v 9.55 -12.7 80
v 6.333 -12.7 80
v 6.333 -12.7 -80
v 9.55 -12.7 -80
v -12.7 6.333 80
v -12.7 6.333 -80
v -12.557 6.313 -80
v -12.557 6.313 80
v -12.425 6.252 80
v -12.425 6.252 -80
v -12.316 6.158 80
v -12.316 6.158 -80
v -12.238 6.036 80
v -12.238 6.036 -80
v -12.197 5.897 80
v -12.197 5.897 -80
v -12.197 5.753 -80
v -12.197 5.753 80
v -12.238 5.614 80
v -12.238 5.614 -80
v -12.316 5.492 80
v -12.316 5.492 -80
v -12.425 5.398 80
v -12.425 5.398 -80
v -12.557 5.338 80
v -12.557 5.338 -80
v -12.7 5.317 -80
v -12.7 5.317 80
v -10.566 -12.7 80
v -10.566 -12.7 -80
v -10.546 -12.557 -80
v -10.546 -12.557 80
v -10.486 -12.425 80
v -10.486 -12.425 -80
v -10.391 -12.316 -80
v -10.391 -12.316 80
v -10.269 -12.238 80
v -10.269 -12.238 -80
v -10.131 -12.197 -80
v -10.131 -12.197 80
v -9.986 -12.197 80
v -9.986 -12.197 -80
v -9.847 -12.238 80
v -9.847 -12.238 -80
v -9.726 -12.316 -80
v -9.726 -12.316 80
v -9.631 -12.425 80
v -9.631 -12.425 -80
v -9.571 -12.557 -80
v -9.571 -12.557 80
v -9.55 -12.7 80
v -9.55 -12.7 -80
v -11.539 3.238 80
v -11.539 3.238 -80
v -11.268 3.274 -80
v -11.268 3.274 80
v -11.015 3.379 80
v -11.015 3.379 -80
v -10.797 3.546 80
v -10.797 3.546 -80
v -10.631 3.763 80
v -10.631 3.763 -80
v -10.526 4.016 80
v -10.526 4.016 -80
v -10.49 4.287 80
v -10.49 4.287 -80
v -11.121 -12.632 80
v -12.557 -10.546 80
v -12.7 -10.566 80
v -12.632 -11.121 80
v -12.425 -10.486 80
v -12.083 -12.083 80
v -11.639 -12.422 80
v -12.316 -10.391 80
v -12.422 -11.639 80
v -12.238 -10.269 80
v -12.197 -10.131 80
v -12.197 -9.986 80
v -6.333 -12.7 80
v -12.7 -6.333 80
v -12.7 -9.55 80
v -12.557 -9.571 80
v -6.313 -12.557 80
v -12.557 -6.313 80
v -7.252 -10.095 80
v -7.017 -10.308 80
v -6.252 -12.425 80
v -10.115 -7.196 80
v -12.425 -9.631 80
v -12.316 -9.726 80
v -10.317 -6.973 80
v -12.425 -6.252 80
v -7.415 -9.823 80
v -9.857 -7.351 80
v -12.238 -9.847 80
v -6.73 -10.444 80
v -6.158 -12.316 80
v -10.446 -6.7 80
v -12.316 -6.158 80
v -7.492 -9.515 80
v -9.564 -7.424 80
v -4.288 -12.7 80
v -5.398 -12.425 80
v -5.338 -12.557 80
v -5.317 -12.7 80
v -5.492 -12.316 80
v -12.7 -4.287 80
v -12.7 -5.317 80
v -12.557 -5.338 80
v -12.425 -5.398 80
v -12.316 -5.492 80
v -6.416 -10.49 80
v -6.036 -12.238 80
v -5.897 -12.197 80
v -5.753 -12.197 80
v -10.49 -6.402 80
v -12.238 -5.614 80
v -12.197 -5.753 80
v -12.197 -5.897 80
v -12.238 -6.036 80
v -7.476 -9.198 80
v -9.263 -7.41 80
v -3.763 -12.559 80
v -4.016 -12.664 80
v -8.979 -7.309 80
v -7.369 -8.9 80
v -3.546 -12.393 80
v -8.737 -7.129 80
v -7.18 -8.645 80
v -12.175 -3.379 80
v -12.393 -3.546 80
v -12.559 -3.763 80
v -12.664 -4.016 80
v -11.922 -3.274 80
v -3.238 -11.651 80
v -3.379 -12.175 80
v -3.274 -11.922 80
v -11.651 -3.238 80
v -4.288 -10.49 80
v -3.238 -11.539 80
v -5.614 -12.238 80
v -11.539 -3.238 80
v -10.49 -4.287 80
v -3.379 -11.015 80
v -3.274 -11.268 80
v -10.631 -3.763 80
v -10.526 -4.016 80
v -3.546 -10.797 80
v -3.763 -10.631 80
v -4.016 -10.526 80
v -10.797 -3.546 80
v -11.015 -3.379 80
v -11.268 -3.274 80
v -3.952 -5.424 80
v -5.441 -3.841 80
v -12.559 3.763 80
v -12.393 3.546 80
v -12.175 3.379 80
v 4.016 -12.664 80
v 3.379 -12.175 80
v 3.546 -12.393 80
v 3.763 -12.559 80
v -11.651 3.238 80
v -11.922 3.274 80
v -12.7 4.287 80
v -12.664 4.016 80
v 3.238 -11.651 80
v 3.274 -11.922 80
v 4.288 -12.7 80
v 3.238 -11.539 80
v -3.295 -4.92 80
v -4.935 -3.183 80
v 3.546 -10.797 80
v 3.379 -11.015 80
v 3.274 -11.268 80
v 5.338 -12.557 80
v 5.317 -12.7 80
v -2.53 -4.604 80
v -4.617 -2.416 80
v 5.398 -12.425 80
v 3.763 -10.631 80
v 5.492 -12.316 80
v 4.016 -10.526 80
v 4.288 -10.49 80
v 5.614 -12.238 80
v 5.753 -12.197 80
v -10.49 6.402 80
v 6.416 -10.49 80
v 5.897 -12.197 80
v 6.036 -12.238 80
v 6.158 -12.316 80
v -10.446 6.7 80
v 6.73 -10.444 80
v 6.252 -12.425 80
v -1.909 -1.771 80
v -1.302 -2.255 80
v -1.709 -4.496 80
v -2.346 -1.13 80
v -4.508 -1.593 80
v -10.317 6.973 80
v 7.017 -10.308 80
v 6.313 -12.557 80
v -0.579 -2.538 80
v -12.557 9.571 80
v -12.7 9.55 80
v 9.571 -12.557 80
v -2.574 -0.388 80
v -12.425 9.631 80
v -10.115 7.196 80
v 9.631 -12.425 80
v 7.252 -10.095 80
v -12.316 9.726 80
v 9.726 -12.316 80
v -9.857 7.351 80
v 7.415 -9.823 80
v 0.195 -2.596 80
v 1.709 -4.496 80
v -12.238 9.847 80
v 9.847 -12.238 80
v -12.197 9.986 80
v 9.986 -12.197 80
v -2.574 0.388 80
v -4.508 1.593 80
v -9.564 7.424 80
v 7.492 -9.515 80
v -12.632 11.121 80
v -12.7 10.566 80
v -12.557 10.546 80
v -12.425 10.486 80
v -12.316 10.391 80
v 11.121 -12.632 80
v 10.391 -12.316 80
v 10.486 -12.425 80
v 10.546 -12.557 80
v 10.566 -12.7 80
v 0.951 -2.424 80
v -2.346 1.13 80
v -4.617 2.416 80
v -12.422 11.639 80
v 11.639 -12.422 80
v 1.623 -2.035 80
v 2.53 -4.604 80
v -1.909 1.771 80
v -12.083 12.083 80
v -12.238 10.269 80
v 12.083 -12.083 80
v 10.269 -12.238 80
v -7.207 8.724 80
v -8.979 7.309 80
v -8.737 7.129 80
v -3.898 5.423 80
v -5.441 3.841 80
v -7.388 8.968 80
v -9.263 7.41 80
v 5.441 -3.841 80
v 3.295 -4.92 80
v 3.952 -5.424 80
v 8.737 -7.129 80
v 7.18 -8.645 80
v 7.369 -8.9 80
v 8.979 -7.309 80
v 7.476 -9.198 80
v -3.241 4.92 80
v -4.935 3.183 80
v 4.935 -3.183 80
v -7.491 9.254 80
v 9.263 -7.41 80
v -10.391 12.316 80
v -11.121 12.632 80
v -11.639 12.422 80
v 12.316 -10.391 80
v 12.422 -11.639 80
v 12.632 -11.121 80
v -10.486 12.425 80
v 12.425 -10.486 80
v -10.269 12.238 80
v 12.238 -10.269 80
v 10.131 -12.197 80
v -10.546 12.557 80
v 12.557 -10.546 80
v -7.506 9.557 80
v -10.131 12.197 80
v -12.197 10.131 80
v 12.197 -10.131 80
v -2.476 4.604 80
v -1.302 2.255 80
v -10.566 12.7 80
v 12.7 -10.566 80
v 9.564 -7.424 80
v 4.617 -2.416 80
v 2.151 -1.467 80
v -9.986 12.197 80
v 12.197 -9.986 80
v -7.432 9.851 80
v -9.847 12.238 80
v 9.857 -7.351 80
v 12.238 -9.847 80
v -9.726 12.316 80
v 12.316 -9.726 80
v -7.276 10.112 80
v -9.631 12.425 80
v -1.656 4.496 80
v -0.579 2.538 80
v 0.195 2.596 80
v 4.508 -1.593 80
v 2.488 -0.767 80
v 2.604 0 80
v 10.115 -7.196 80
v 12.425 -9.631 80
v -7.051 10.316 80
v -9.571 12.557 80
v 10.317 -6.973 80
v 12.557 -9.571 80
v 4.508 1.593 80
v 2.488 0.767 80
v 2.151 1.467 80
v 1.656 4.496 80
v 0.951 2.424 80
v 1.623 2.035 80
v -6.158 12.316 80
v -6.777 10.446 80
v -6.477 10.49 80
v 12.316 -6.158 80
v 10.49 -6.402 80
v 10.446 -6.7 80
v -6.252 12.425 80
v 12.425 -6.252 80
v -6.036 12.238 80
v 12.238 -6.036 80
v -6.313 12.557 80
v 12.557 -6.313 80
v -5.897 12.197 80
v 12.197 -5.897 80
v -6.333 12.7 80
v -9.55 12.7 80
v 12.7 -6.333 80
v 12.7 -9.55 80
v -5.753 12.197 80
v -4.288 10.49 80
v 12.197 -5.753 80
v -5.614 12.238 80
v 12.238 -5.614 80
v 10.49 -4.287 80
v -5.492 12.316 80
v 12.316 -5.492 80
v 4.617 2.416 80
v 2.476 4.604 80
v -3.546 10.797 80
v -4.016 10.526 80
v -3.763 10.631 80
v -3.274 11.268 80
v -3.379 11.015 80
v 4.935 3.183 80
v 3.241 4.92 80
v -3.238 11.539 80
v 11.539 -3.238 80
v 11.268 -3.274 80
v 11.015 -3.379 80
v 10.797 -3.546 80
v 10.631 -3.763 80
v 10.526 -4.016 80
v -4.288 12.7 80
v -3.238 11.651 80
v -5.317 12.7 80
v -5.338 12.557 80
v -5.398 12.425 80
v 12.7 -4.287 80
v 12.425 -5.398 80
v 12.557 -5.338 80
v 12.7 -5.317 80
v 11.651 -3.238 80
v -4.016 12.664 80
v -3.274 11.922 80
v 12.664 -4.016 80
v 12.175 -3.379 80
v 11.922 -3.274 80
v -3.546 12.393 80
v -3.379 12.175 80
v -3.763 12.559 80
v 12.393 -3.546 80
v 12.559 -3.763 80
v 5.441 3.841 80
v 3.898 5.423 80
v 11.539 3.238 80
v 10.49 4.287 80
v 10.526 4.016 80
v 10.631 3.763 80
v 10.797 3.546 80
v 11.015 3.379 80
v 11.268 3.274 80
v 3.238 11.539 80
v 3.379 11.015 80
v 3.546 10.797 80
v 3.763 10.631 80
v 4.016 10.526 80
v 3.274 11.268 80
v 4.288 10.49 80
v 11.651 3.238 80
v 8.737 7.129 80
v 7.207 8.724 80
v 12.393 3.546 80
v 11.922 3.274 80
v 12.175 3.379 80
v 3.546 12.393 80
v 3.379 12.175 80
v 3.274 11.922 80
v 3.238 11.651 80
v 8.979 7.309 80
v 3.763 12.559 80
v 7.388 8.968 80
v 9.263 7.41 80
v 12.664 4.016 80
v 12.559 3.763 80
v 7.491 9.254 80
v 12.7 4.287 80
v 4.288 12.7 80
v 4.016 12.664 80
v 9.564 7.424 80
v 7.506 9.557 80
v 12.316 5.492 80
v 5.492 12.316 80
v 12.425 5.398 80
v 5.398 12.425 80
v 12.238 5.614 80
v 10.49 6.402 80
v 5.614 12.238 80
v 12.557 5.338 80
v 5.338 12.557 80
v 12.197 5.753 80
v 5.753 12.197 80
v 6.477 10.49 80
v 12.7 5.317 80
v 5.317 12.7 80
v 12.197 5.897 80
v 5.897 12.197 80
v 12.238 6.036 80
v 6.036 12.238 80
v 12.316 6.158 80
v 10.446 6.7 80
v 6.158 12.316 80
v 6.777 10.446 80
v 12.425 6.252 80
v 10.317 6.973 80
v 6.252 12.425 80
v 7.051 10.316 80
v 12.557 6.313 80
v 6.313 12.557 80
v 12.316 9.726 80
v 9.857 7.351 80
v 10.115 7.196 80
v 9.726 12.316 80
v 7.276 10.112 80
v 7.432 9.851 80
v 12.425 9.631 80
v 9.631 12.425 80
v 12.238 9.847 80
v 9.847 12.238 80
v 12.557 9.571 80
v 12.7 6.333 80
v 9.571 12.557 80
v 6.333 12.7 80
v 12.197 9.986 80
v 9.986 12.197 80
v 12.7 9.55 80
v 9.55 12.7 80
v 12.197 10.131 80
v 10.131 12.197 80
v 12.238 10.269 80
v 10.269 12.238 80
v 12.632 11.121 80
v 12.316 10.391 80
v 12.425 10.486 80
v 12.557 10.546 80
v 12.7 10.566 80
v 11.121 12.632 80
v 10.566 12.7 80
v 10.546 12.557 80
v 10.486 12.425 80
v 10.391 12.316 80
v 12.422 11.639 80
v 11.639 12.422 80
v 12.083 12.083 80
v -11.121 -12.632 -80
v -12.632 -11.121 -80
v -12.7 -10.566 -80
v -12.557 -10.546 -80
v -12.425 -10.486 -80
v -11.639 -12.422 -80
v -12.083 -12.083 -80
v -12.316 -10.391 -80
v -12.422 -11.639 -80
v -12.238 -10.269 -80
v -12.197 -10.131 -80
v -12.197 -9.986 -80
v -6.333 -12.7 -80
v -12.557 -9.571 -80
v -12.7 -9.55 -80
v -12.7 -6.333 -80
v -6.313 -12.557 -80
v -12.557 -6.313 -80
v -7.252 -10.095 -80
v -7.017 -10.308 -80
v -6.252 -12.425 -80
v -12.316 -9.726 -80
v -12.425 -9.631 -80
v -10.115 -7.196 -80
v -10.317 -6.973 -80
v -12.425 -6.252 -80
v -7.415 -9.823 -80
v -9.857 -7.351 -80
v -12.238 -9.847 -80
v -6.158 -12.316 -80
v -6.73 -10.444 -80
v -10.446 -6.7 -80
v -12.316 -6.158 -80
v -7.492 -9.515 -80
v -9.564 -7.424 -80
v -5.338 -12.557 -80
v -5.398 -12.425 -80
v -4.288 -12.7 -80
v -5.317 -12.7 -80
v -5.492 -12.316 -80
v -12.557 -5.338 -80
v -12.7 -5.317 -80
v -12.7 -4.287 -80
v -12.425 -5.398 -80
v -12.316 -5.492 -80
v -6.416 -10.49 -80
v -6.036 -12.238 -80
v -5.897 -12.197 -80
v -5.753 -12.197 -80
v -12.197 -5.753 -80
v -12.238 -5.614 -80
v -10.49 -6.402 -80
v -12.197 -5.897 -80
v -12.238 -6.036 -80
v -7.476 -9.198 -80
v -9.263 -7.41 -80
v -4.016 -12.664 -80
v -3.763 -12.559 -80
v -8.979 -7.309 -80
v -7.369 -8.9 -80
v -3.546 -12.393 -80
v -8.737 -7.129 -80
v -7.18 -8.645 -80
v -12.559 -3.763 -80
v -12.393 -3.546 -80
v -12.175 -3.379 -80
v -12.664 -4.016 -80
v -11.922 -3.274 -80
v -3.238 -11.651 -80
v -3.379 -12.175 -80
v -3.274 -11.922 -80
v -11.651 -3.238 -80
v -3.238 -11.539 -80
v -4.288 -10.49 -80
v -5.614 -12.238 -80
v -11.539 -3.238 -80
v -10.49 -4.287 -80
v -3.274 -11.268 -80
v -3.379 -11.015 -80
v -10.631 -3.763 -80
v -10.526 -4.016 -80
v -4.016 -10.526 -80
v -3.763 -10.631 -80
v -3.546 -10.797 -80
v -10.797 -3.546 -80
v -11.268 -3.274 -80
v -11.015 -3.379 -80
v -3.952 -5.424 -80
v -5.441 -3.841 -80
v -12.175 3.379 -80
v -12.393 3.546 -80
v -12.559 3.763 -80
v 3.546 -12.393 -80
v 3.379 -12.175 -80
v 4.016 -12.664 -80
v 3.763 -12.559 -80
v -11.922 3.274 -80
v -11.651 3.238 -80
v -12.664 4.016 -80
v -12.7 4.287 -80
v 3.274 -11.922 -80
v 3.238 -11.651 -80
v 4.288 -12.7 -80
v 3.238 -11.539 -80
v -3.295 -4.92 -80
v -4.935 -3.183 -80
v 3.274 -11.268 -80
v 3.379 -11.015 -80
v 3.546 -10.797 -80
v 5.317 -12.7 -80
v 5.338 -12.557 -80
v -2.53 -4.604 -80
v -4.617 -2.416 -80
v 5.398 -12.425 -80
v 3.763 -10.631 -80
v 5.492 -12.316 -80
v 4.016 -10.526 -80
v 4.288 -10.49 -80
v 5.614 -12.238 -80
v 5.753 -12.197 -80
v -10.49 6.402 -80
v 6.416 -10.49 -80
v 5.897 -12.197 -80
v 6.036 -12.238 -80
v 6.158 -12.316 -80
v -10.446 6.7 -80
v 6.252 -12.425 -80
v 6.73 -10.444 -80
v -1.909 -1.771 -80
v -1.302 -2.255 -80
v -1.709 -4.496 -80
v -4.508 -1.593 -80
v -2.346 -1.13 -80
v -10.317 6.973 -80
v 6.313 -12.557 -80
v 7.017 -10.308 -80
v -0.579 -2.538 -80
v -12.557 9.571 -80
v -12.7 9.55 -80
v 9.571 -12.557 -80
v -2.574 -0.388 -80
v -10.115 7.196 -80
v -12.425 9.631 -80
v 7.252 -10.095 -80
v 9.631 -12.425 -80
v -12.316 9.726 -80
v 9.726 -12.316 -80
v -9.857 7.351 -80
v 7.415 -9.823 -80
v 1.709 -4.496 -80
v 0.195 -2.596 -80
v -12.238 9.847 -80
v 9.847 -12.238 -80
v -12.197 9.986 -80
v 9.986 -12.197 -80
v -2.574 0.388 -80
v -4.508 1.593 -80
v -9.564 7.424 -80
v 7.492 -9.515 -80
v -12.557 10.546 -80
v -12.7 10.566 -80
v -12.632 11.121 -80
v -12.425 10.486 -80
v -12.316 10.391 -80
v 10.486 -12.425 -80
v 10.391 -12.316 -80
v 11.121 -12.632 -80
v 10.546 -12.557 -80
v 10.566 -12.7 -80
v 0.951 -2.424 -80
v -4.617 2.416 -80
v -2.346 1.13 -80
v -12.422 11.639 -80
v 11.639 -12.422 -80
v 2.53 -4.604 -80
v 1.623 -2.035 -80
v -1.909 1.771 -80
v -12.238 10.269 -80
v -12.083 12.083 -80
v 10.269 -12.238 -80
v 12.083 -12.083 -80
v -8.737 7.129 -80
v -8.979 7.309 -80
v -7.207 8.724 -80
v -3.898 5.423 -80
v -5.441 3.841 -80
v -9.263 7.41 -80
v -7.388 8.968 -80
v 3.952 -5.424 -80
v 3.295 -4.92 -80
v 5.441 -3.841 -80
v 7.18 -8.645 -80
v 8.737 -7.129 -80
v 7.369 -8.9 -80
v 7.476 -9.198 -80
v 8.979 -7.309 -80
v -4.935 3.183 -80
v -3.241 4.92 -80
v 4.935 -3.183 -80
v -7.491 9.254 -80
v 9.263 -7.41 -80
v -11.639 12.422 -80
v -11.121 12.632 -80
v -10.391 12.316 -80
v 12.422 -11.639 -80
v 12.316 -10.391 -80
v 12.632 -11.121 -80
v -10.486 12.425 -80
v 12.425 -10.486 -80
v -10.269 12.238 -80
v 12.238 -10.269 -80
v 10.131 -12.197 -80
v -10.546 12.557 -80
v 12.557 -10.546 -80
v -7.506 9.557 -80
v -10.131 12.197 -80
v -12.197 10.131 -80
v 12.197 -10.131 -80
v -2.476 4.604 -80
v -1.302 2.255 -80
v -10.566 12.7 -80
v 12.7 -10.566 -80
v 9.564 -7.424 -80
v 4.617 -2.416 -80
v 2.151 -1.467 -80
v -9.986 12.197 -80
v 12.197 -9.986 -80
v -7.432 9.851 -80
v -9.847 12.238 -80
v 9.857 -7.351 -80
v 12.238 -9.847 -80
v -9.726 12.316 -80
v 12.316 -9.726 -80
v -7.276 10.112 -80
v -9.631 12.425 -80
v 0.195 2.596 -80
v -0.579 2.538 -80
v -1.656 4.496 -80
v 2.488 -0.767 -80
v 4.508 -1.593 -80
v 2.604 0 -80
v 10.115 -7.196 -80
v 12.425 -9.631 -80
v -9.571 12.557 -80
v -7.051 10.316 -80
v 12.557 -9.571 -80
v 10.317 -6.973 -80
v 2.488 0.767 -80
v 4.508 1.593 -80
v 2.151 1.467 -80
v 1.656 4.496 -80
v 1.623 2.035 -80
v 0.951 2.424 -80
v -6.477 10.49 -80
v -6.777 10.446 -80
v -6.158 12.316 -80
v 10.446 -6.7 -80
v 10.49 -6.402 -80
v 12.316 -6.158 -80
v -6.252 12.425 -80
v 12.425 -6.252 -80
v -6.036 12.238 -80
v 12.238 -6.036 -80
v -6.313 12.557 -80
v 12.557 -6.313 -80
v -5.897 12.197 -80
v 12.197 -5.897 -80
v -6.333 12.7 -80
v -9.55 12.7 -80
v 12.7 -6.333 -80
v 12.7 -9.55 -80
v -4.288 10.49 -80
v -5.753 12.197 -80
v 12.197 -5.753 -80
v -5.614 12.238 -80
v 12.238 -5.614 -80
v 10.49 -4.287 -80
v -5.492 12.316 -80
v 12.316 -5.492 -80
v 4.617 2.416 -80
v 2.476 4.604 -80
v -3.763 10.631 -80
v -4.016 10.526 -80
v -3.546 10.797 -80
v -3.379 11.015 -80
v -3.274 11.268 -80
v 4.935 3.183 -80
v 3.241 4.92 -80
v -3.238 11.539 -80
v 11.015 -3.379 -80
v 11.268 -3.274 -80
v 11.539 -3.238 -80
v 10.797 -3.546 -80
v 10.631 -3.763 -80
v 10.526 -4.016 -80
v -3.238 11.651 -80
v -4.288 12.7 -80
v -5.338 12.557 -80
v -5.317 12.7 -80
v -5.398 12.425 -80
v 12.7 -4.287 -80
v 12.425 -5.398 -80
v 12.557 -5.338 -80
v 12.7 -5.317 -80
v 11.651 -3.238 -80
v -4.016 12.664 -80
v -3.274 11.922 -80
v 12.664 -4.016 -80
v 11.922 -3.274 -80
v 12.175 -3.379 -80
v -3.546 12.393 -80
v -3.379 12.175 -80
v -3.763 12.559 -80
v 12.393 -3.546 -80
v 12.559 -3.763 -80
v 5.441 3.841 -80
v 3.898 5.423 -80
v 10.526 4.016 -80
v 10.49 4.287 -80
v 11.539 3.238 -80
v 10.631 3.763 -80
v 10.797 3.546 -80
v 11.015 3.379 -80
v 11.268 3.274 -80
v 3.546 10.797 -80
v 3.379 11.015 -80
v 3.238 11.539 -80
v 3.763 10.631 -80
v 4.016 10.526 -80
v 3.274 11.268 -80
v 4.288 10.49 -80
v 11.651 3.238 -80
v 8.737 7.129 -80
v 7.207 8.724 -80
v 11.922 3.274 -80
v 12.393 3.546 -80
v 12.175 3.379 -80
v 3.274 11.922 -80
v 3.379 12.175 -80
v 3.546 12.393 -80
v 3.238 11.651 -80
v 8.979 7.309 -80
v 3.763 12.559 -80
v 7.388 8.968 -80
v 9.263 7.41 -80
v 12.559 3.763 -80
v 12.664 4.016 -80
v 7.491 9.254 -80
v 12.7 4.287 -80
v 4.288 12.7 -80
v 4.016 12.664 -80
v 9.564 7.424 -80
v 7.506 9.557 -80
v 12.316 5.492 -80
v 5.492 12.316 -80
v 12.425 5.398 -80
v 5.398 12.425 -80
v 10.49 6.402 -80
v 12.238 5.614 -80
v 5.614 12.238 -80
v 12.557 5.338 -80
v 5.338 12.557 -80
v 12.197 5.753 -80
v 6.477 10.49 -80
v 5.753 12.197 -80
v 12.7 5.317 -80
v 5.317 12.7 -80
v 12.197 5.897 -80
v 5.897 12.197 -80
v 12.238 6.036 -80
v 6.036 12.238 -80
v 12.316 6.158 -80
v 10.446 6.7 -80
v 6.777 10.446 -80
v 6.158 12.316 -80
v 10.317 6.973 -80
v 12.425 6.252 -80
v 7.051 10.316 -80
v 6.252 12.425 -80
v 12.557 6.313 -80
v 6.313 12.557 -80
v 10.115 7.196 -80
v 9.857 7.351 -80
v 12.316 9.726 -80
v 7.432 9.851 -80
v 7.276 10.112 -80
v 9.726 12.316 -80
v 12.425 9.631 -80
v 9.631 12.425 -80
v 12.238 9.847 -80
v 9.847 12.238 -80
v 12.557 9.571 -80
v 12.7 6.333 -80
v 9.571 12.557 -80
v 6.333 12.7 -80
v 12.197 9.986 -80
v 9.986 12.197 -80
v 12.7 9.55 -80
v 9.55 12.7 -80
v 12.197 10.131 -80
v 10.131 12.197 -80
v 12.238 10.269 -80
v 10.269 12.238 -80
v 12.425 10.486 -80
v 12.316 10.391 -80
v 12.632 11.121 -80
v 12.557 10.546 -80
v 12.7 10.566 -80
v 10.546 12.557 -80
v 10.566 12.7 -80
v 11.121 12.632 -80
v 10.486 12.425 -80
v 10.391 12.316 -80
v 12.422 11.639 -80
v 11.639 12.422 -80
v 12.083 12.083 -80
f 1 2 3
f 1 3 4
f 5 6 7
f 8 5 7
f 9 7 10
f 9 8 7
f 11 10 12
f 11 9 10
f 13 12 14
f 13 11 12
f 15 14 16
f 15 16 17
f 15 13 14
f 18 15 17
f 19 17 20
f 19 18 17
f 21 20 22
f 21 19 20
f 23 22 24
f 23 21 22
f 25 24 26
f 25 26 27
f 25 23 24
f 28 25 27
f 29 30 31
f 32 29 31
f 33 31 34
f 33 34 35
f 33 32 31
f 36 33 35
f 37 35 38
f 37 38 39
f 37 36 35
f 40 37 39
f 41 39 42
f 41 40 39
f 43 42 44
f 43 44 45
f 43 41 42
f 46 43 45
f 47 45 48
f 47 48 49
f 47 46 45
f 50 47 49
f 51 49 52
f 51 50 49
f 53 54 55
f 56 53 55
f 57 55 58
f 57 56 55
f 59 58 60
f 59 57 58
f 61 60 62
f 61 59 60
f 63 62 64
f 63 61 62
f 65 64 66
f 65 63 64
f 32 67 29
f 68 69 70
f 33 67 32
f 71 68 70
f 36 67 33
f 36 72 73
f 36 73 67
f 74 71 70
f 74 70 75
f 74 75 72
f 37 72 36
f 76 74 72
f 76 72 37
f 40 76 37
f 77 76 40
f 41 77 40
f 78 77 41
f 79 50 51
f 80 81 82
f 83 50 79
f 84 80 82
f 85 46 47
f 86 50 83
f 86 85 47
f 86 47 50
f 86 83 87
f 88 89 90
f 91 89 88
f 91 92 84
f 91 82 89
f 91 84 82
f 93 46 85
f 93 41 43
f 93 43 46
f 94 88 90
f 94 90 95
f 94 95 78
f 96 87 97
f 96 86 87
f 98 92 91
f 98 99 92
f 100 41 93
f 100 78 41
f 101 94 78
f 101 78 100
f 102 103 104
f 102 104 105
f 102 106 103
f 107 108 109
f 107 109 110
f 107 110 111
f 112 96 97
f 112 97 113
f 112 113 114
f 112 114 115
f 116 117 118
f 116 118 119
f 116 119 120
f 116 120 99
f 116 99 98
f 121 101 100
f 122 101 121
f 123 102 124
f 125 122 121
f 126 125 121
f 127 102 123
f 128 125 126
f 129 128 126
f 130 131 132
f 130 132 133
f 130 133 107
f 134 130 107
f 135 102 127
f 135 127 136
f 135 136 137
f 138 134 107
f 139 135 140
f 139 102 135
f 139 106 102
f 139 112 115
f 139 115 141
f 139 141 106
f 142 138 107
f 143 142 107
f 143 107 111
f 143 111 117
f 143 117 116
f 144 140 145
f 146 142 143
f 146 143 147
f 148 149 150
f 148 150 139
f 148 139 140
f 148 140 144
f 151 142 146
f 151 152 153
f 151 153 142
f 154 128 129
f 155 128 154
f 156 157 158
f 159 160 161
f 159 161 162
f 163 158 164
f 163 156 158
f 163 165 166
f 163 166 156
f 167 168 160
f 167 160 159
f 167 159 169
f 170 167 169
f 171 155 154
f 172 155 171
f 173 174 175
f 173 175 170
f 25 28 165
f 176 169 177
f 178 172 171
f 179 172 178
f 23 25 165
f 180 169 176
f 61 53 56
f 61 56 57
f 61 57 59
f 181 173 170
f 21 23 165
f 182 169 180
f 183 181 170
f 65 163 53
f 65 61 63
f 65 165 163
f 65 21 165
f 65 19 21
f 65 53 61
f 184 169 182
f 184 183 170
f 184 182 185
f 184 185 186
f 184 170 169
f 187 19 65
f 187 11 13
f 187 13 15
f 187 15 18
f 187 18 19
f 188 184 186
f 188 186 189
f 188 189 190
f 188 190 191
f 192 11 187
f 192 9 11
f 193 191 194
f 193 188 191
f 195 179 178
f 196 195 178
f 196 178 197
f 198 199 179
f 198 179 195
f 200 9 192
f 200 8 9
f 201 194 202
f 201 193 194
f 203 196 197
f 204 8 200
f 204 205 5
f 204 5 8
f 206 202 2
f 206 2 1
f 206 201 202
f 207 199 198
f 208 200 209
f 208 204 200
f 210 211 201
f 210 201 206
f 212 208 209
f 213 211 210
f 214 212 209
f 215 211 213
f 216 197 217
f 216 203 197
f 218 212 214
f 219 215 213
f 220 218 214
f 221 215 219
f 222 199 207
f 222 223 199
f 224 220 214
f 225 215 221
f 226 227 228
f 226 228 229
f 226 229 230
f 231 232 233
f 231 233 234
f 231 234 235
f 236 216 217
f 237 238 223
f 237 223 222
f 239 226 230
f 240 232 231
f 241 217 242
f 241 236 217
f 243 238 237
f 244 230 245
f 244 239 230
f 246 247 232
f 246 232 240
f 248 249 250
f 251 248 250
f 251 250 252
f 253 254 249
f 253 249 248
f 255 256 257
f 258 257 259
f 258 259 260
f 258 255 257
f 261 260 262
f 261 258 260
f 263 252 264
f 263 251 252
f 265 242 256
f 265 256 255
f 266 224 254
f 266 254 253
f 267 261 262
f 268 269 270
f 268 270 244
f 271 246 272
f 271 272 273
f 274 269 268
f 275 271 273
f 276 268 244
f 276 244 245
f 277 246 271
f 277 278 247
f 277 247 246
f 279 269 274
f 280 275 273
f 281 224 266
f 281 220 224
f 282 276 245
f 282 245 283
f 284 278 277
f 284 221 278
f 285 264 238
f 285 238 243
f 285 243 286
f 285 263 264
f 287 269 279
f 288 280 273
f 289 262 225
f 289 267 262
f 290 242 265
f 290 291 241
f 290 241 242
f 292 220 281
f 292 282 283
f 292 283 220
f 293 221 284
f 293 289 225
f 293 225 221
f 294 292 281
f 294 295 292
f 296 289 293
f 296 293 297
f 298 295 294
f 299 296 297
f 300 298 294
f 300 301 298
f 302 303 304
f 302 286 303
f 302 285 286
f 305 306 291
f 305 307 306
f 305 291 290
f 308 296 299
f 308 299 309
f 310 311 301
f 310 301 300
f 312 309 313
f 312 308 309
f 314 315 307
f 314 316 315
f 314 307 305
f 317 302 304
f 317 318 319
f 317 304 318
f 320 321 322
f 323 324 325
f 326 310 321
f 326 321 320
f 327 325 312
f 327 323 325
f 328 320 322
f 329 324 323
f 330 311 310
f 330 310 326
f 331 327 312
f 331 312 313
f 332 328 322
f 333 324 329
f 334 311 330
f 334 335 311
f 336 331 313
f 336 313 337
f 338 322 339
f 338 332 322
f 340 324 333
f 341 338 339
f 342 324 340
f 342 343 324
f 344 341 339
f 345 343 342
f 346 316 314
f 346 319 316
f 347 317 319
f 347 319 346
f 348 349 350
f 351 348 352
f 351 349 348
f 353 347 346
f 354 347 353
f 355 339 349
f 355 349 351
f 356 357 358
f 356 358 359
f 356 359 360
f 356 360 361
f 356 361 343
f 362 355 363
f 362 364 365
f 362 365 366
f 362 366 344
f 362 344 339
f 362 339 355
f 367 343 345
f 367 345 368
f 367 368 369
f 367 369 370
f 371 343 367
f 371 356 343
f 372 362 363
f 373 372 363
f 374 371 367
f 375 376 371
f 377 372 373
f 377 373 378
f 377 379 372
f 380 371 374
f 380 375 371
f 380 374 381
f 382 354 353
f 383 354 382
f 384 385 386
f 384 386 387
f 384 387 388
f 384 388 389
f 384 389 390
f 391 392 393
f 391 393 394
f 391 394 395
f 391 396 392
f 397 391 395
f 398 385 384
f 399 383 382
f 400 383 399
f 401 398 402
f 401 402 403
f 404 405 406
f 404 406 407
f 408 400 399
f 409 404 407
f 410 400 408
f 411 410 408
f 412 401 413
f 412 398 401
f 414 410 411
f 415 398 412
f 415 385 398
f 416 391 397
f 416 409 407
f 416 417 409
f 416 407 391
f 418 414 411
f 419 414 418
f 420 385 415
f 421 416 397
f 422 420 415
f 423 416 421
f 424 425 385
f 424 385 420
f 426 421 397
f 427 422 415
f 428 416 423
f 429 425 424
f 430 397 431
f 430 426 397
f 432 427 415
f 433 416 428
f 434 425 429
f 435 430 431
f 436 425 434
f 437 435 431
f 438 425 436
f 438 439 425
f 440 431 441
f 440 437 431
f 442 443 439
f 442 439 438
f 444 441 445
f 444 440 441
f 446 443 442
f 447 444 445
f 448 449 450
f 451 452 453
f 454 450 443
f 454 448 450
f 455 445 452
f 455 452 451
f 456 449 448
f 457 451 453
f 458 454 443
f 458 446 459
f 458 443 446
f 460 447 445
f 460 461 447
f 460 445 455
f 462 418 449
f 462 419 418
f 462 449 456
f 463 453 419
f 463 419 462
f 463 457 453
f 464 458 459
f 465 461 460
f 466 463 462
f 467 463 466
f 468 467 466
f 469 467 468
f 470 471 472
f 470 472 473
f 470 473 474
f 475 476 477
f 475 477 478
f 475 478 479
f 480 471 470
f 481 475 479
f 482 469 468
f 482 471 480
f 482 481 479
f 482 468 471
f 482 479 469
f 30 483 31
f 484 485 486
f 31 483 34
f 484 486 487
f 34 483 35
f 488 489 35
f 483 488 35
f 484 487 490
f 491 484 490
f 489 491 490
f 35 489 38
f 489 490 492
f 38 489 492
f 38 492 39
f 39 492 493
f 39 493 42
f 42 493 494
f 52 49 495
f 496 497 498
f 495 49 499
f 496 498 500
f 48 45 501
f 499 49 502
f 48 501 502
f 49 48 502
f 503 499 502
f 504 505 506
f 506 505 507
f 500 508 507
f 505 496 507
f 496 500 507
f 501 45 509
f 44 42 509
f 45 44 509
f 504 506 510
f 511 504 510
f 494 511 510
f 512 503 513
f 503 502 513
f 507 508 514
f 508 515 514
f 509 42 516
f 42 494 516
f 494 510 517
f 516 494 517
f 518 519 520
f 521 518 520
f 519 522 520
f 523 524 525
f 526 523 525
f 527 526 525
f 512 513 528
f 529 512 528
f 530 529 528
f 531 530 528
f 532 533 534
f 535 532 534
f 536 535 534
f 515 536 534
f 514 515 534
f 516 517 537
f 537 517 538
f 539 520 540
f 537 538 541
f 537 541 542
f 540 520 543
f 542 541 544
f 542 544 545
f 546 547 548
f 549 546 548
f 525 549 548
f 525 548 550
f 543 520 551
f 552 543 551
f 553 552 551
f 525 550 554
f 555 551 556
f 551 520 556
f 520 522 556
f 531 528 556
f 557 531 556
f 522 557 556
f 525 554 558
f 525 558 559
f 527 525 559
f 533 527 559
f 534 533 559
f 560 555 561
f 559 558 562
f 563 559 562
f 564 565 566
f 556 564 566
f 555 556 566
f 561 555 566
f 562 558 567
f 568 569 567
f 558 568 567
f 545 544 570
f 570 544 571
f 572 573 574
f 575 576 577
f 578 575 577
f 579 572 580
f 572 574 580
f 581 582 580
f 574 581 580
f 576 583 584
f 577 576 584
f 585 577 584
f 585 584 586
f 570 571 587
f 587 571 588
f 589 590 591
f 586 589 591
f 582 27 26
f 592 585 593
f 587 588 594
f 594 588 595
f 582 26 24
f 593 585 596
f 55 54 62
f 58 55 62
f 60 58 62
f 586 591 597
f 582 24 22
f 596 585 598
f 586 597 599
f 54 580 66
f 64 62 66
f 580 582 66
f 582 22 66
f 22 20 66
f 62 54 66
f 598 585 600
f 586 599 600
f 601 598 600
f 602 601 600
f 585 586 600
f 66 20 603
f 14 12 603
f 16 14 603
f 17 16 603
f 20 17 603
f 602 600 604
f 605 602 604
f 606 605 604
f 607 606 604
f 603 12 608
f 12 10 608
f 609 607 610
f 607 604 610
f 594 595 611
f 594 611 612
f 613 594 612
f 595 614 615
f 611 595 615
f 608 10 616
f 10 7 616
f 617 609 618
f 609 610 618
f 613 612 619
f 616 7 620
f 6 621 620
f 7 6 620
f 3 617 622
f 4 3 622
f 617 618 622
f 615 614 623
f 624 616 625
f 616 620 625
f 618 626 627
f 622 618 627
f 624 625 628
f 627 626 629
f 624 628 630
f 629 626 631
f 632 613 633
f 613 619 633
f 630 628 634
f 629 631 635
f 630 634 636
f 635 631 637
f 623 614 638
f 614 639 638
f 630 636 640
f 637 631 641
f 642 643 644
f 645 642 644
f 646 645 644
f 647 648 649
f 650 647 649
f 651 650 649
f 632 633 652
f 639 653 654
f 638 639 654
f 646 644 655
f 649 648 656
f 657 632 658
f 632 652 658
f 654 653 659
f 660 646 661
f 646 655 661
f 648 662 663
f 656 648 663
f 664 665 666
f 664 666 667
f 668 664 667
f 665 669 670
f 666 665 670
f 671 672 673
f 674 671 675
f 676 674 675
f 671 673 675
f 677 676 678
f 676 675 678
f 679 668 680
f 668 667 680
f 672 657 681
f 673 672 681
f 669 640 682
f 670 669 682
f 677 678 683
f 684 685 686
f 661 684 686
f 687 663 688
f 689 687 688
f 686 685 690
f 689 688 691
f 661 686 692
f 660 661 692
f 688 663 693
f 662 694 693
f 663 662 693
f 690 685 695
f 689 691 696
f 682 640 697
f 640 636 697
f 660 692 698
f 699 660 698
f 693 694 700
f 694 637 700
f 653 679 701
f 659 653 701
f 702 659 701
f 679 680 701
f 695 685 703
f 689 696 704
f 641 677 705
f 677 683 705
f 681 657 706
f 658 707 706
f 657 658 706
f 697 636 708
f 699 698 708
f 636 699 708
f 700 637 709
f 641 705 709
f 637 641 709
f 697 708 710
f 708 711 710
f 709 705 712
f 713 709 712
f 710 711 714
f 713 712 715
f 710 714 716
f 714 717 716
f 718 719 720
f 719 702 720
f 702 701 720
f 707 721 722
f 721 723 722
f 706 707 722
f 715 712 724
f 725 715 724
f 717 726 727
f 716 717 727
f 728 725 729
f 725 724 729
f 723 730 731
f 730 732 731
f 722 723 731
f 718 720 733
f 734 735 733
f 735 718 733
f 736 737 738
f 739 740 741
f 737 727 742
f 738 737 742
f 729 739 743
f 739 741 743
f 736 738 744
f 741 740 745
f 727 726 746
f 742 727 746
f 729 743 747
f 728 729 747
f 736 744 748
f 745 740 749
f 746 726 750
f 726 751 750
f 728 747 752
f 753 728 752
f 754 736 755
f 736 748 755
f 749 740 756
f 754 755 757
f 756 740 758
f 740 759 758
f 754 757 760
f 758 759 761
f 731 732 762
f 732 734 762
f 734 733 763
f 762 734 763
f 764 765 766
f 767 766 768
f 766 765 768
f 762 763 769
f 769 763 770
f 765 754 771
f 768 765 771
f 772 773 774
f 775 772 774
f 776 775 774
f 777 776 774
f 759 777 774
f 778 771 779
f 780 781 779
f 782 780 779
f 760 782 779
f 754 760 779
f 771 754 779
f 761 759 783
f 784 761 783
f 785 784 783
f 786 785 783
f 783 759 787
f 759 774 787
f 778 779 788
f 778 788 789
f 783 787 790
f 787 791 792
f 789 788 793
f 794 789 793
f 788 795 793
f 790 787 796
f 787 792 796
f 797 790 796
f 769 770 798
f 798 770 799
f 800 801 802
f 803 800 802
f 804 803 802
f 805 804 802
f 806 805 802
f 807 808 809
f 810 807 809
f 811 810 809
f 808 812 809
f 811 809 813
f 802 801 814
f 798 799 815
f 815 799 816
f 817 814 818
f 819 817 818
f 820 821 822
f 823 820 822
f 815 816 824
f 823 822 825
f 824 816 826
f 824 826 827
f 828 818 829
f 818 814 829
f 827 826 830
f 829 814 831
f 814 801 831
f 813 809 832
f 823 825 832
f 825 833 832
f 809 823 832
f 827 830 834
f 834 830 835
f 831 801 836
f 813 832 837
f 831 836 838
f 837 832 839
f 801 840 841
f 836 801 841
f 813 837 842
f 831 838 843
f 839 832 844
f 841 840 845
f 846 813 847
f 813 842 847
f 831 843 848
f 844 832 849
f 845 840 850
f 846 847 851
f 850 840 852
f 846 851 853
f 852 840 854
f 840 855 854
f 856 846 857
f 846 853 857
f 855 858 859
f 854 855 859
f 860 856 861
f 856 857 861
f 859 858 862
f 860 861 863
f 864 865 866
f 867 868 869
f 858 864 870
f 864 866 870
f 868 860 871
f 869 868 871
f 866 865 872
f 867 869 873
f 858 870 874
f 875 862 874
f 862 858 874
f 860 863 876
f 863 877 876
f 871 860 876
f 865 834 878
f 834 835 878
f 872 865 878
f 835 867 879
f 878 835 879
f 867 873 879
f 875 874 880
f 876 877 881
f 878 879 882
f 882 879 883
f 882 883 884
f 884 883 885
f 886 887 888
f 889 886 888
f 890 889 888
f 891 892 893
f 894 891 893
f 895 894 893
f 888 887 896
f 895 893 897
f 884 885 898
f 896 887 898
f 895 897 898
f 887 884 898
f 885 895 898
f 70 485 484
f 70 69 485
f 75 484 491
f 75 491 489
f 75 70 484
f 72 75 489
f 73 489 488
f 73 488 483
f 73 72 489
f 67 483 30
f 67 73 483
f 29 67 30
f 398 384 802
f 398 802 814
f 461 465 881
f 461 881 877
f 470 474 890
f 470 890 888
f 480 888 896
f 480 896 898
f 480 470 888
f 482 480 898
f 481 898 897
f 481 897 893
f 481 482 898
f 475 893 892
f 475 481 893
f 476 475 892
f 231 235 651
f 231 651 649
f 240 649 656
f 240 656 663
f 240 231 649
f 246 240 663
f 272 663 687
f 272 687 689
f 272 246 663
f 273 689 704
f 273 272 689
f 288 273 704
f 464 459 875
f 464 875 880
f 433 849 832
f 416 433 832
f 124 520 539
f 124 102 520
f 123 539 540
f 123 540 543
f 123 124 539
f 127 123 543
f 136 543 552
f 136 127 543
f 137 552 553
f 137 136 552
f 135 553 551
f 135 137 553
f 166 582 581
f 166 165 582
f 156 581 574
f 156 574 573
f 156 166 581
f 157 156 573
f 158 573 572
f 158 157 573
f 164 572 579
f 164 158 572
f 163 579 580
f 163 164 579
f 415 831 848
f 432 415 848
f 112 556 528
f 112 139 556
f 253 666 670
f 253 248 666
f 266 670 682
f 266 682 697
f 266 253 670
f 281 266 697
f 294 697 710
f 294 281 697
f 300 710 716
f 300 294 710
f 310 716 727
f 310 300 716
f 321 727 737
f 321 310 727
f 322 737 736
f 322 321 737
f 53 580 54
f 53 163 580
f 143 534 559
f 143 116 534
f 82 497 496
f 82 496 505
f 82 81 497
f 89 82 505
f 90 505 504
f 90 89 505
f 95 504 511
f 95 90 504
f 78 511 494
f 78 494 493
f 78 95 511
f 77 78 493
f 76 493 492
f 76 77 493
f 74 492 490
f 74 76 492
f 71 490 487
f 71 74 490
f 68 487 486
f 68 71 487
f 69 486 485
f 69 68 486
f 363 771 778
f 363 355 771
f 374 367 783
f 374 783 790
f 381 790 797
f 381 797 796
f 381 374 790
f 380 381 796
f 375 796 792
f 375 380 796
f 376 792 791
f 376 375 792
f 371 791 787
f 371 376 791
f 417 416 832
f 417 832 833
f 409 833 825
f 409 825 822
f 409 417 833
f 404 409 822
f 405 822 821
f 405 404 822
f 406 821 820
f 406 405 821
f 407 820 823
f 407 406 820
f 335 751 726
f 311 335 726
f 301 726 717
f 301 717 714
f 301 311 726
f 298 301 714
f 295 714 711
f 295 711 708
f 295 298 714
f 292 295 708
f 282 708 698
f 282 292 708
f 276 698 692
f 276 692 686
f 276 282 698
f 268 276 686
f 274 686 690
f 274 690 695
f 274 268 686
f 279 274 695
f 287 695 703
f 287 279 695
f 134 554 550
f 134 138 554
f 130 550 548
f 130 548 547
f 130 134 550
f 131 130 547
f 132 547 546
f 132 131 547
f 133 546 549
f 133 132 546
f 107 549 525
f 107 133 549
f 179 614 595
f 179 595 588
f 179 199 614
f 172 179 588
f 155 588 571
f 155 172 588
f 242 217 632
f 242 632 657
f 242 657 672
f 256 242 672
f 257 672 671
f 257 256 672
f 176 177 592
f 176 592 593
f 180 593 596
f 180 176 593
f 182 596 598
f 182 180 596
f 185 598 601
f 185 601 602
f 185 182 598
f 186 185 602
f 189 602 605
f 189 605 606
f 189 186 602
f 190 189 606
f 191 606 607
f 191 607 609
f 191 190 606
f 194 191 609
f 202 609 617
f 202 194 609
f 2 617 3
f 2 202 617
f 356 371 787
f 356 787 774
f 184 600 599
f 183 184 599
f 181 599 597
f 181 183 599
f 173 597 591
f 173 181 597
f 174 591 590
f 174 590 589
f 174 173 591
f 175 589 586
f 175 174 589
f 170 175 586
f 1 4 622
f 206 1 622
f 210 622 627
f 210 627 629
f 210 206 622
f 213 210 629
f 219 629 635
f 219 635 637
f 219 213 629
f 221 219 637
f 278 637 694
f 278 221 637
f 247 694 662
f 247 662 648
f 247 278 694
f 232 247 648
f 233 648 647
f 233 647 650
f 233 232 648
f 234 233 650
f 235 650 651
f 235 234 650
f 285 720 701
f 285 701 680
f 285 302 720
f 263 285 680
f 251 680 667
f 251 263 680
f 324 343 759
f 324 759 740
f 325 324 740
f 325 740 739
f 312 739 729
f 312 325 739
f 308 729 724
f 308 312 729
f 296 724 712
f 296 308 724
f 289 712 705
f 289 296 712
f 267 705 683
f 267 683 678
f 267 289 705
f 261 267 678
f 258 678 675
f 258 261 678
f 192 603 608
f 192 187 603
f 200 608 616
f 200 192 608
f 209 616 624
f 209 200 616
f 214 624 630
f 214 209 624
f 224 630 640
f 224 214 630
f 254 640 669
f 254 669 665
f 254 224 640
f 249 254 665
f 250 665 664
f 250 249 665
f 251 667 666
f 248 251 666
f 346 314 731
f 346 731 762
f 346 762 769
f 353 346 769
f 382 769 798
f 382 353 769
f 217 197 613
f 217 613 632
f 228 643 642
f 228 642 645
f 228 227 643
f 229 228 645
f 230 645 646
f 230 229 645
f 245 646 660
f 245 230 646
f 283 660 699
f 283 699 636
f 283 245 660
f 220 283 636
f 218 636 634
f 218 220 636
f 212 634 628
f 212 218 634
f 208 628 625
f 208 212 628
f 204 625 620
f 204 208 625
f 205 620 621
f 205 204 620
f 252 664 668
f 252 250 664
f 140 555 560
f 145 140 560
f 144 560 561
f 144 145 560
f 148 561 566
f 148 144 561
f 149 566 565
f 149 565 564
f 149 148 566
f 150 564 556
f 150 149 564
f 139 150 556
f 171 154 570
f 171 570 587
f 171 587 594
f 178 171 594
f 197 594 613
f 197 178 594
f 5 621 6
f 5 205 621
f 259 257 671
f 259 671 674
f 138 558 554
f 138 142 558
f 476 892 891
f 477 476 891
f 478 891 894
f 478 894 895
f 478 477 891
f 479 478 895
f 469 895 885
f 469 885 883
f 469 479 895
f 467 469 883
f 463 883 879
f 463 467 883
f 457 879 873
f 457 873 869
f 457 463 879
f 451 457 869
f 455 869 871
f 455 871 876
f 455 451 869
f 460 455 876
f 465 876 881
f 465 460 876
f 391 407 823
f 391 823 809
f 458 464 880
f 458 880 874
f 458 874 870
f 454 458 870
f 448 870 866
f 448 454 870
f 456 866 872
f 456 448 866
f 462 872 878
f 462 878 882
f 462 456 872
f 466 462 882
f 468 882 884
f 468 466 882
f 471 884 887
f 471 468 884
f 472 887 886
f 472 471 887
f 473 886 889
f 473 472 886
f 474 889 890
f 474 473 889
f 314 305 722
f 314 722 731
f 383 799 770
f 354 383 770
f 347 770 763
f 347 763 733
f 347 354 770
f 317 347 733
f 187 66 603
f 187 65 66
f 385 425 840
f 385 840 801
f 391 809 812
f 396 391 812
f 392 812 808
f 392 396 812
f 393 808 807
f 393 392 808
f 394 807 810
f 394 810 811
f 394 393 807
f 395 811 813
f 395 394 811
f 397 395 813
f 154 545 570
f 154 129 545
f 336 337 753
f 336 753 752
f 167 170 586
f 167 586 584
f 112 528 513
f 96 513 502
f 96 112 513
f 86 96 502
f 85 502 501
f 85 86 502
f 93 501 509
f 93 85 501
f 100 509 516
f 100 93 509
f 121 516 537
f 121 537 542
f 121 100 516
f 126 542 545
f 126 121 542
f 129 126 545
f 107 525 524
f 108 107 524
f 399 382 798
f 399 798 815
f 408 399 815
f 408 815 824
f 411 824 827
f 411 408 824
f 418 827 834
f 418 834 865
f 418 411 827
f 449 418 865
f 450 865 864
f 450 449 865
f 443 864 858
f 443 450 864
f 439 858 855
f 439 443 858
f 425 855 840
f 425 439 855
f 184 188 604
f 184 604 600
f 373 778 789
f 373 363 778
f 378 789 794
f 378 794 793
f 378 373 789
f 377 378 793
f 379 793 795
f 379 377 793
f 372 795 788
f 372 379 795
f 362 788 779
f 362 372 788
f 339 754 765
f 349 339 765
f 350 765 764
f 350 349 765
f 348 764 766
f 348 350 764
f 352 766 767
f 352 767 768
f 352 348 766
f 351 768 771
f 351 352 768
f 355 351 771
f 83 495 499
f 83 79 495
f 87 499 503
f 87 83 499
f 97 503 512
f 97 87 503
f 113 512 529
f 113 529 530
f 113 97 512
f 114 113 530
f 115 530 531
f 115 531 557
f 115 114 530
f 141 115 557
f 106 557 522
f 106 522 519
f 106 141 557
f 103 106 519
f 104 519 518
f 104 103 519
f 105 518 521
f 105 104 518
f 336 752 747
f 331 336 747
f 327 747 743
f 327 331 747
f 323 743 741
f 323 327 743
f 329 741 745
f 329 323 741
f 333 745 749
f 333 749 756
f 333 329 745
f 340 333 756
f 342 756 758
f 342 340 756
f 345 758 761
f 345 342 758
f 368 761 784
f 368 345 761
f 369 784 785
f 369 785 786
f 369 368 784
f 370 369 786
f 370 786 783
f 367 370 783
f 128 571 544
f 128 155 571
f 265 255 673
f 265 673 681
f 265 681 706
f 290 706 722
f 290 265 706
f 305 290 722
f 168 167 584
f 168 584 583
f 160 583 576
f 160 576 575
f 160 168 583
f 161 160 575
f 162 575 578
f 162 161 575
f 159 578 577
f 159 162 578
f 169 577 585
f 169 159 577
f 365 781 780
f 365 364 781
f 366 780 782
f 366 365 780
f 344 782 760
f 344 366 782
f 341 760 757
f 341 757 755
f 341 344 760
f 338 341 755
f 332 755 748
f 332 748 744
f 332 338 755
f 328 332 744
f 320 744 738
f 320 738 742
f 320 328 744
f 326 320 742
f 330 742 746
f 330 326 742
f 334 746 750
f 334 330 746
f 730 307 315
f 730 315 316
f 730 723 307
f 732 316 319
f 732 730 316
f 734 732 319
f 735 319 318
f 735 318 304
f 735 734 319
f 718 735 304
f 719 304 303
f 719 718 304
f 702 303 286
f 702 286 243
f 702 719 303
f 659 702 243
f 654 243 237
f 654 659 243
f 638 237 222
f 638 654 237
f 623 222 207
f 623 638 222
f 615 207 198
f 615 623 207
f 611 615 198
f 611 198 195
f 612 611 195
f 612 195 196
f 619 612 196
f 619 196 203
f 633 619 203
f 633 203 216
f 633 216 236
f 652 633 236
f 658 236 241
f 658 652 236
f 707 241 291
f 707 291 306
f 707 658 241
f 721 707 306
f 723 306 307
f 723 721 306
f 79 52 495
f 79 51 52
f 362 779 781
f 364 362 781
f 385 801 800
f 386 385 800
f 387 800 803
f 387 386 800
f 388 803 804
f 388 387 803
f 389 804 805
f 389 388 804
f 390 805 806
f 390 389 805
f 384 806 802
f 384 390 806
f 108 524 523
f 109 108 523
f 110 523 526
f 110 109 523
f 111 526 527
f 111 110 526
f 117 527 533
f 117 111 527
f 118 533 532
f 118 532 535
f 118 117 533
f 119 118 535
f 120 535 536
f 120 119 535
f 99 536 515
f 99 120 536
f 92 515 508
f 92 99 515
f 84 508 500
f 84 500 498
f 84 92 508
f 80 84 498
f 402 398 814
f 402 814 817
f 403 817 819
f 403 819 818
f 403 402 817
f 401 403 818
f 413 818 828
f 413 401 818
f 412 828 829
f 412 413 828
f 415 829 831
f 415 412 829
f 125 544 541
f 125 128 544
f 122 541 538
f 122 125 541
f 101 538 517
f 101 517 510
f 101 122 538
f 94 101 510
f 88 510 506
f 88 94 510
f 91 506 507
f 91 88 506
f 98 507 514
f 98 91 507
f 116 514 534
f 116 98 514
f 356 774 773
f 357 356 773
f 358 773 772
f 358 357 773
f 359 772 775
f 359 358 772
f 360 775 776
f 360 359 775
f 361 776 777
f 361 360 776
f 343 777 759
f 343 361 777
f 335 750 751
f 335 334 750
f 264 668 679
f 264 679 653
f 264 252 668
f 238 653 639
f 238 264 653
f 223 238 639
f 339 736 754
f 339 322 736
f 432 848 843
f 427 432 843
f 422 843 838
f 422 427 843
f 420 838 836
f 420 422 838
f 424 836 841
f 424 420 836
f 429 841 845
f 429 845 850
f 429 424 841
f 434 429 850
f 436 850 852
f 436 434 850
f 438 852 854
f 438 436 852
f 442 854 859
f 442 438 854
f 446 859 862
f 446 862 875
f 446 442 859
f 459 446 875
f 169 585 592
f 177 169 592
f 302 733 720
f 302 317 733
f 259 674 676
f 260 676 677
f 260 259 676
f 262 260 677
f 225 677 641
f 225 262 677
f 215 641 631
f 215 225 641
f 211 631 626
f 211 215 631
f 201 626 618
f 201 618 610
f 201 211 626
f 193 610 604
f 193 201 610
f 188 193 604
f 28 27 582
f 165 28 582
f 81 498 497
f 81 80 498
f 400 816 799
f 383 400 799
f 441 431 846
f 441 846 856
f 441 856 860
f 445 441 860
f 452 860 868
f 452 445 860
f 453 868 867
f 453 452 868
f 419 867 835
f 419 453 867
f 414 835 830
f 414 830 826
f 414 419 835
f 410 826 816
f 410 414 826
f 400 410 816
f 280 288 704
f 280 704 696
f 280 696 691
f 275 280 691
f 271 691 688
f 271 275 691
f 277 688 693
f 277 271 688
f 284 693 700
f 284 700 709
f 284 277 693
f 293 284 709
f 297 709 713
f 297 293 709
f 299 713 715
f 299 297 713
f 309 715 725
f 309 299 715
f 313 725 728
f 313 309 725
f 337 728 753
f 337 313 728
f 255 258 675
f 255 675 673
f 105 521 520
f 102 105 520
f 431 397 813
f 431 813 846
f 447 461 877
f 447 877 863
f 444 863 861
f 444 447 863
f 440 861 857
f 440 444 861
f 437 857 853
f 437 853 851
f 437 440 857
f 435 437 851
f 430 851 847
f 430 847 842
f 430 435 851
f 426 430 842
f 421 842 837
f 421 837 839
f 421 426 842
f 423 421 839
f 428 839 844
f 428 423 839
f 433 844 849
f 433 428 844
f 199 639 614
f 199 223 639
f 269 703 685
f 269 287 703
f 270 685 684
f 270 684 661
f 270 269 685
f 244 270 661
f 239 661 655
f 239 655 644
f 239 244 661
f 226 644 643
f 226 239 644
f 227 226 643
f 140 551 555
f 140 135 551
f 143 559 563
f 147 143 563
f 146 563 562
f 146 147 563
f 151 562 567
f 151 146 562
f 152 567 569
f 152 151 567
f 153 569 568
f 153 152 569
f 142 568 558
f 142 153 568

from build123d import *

# Parameters (mm, degrees)
SKETCH1_R           = 2.6035
BOSS_EXTRUDE1_DEPTH = 80


with BuildPart() as part:
    # Sketch1 → Boss-Extrude1 (new body, symmetric)
    with BuildSketch(Plane.XY):
        with BuildLine():
            Line((-7.179650497, -8.645192506), (-3.952270251, -5.423690499))
            ThreePointArc((-3.952270251, -5.423690499), (-2.922936451, -4.736929036), (-1.709253557, -4.4958))
            Line((-1.709253557, -4.4958), (1.709253557, -4.4958))
            ThreePointArc((1.709253557, -4.4958), (2.922936451, -4.736929036), (3.952270251, -5.423690499))
            Line((3.952270251, -5.423690499), (7.179650497, -8.645192506))
            ThreePointArc((7.179650497, -8.645192506), (7.41473083, -9.822813117), (6.416408329, -10.4902))
            Line((6.416408329, -10.4902), (4.287512407, -10.4902))
            ThreePointArc((4.287512407, -10.4902), (3.54574862, -10.79744862), (3.2385, -11.539212407))
            Line((3.2385, -11.539212407), (3.2385, -11.650987593))
            ThreePointArc((3.2385, -11.650987593), (3.54574862, -12.39275138), (4.287512407, -12.7))
            Line((4.287512407, -12.7), (5.317126718, -12.7))
            ThreePointArc((5.317126718, -12.7), (5.825126718, -12.192), (6.333126718, -12.7))
            Line((6.333126718, -12.7), (9.550443118, -12.7))
            ThreePointArc((9.550443118, -12.7), (10.058366869, -12.192000006), (10.566443095, -12.699847501))
            ThreePointArc((10.566443095, -12.699847501), (12.082537762, -12.08250727), (12.699846982, -10.566399977))
            ThreePointArc((12.699846982, -10.566399977), (12.192000006, -10.058323491), (12.7, -9.5504))
            Line((12.7, -9.5504), (12.7, -6.3330836))
            ThreePointArc((12.7, -6.3330836), (12.192, -5.8250836), (12.7, -5.3170836))
            Line((12.7, -5.3170836), (12.7, -4.287469289))
            ThreePointArc((12.7, -4.287469289), (12.39275138, -3.545705502), (11.650987593, -3.238456882))
            Line((11.650987593, -3.238456882), (11.539212407, -3.238456882))
            ThreePointArc((11.539212407, -3.238456882), (10.79744862, -3.545705502), (10.4902, -4.287469289))
            Line((10.4902, -4.287469289), (10.4902, -6.402089023))
            ThreePointArc((10.4902, -6.402089023), (9.856505071, -7.351067942), (8.737131347, -7.129408934))
            Line((8.737131347, -7.129408934), (5.441005833, -3.840816462))
            ThreePointArc((5.441005833, -3.840816462), (4.750877967, -2.809883091), (4.5085, -1.593185507))
            Line((4.5085, -1.593185507), (4.5085, 1.593185507))
            ThreePointArc((4.5085, 1.593185507), (4.750877967, 2.809883091), (5.441005833, 3.840816462))
            Line((5.441005833, 3.840816462), (8.737131347, 7.129408934))
            ThreePointArc((8.737131347, 7.129408934), (9.856505071, 7.351067942), (10.4902, 6.402089023))
            Line((10.4902, 6.402089023), (10.4902, 4.287469289))
            ThreePointArc((10.4902, 4.287469289), (10.79744862, 3.545705502), (11.539212407, 3.238456882))
            Line((11.539212407, 3.238456882), (11.650987593, 3.238456882))
            ThreePointArc((11.650987593, 3.238456882), (12.39275138, 3.545705502), (12.7, 4.287469289))
            Line((12.7, 4.287469289), (12.7, 5.3170836))
            ThreePointArc((12.7, 5.3170836), (12.192, 5.8250836), (12.7, 6.3330836))
            Line((12.7, 6.3330836), (12.7, 9.5504))
            ThreePointArc((12.7, 9.5504), (12.192000006, 10.058323491), (12.699846982, 10.566399977))
            ThreePointArc((12.699846982, 10.566399977), (12.082537762, 12.08250727), (10.566443095, 12.699847501))
            ThreePointArc((10.566443095, 12.699847501), (10.058366869, 12.192000006), (9.550443118, 12.7))
            Line((9.550443118, 12.7), (6.333126718, 12.7))
            ThreePointArc((6.333126718, 12.7), (5.825126718, 12.192), (5.317126718, 12.7))
            Line((5.317126718, 12.7), (4.287512407, 12.7))
            ThreePointArc((4.287512407, 12.7), (3.54574862, 12.39275138), (3.2385, 11.650987593))
            Line((3.2385, 11.650987593), (3.2385, 11.539212407))
            ThreePointArc((3.2385, 11.539212407), (3.54574862, 10.79744862), (4.287512407, 10.4902))
            Line((4.287512407, 10.4902), (6.476788598, 10.4902))
            ThreePointArc((6.476788598, 10.4902), (7.432222385, 9.85140422), (7.207036008, 8.724370562))
            Line((7.207036008, 8.724370562), (3.898272566, 5.423169045))
            ThreePointArc((3.898272566, 5.423169045), (2.869120213, 4.736787962), (1.655778399, 4.4958))
            Line((1.655778399, 4.4958), (-1.655778399, 4.4958))
            ThreePointArc((-1.655778399, 4.4958), (-2.869120213, 4.736787962), (-3.898272566, 5.423169045))
            Line((-3.898272566, 5.423169045), (-7.207036008, 8.724370562))
            ThreePointArc((-7.207036008, 8.724370562), (-7.432222385, 9.85140422), (-6.476788598, 10.4902))
            Line((-6.476788598, 10.4902), (-4.287512407, 10.4902))
            ThreePointArc((-4.287512407, 10.4902), (-3.54574862, 10.79744862), (-3.2385, 11.539212407))
            Line((-3.2385, 11.539212407), (-3.2385, 11.650987593))
            ThreePointArc((-3.2385, 11.650987593), (-3.54574862, 12.39275138), (-4.287512407, 12.7))
            Line((-4.287512407, 12.7), (-5.317126718, 12.7))
            ThreePointArc((-5.317126718, 12.7), (-5.825126718, 12.192), (-6.333126718, 12.7))
            Line((-6.333126718, 12.7), (-9.550443118, 12.7))
            ThreePointArc((-9.550443118, 12.7), (-10.058366869, 12.192000006), (-10.566443095, 12.699847501))
            ThreePointArc((-10.566443095, 12.699847501), (-12.082537762, 12.08250727), (-12.699846982, 10.566399977))
            ThreePointArc((-12.699846982, 10.566399977), (-12.192000006, 10.058323491), (-12.7, 9.5504))
            Line((-12.7, 9.5504), (-12.7, 6.3330836))
            ThreePointArc((-12.7, 6.3330836), (-12.192, 5.8250836), (-12.7, 5.3170836))
            Line((-12.7, 5.3170836), (-12.7, 4.287469289))
            ThreePointArc((-12.7, 4.287469289), (-12.39275138, 3.545705502), (-11.650987593, 3.238456882))
            Line((-11.650987593, 3.238456882), (-11.539212407, 3.238456882))
            ThreePointArc((-11.539212407, 3.238456882), (-10.79744862, 3.545705502), (-10.4902, 4.287469289))
            Line((-10.4902, 4.287469289), (-10.4902, 6.402089023))
            ThreePointArc((-10.4902, 6.402089023), (-9.856505071, 7.351067942), (-8.737131347, 7.129408934))
            Line((-8.737131347, 7.129408934), (-5.441005833, 3.840816462))
            ThreePointArc((-5.441005833, 3.840816462), (-4.750877967, 2.809883091), (-4.5085, 1.593185507))
            Line((-4.5085, 1.593185507), (-4.5085, -1.593185507))
            ThreePointArc((-4.5085, -1.593185507), (-4.750877967, -2.809883091), (-5.441005833, -3.840816462))
            Line((-5.441005833, -3.840816462), (-8.737131347, -7.129408934))
            ThreePointArc((-8.737131347, -7.129408934), (-9.856505071, -7.351067942), (-10.4902, -6.402089023))
            Line((-10.4902, -6.402089023), (-10.4902, -4.287469289))
            ThreePointArc((-10.4902, -4.287469289), (-10.79744862, -3.545705502), (-11.539212407, -3.238456882))
            Line((-11.539212407, -3.238456882), (-11.650987593, -3.238456882))
            ThreePointArc((-11.650987593, -3.238456882), (-12.39275138, -3.545705502), (-12.7, -4.287469289))
            Line((-12.7, -4.287469289), (-12.7, -5.3170836))
            ThreePointArc((-12.7, -5.3170836), (-12.192, -5.8250836), (-12.7, -6.3330836))
            Line((-12.7, -6.3330836), (-12.7, -9.5504))
            ThreePointArc((-12.7, -9.5504), (-12.192000006, -10.058323491), (-12.699846982, -10.566399977))
            ThreePointArc((-12.699846982, -10.566399977), (-12.082537762, -12.08250727), (-10.566443095, -12.699847501))
            ThreePointArc((-10.566443095, -12.699847501), (-10.058366869, -12.192000006), (-9.550443118, -12.7))
            Line((-9.550443118, -12.7), (-6.333126718, -12.7))
            ThreePointArc((-6.333126718, -12.7), (-5.825126718, -12.192), (-5.317126718, -12.7))
            Line((-5.317126718, -12.7), (-4.287512407, -12.7))
            ThreePointArc((-4.287512407, -12.7), (-3.54574862, -12.39275138), (-3.2385, -11.650987593))
            Line((-3.2385, -11.650987593), (-3.2385, -11.539212407))
            ThreePointArc((-3.2385, -11.539212407), (-3.54574862, -10.79744862), (-4.287512407, -10.4902))
            Line((-4.287512407, -10.4902), (-6.416408329, -10.4902))
            ThreePointArc((-6.416408329, -10.4902), (-7.41473083, -9.822813117), (-7.179650497, -8.645192506))
        make_face()
        Circle(SKETCH1_R, mode=Mode.SUBTRACT)
    extrude(amount=BOSS_EXTRUDE1_DEPTH, both=True)


solid = part.part
